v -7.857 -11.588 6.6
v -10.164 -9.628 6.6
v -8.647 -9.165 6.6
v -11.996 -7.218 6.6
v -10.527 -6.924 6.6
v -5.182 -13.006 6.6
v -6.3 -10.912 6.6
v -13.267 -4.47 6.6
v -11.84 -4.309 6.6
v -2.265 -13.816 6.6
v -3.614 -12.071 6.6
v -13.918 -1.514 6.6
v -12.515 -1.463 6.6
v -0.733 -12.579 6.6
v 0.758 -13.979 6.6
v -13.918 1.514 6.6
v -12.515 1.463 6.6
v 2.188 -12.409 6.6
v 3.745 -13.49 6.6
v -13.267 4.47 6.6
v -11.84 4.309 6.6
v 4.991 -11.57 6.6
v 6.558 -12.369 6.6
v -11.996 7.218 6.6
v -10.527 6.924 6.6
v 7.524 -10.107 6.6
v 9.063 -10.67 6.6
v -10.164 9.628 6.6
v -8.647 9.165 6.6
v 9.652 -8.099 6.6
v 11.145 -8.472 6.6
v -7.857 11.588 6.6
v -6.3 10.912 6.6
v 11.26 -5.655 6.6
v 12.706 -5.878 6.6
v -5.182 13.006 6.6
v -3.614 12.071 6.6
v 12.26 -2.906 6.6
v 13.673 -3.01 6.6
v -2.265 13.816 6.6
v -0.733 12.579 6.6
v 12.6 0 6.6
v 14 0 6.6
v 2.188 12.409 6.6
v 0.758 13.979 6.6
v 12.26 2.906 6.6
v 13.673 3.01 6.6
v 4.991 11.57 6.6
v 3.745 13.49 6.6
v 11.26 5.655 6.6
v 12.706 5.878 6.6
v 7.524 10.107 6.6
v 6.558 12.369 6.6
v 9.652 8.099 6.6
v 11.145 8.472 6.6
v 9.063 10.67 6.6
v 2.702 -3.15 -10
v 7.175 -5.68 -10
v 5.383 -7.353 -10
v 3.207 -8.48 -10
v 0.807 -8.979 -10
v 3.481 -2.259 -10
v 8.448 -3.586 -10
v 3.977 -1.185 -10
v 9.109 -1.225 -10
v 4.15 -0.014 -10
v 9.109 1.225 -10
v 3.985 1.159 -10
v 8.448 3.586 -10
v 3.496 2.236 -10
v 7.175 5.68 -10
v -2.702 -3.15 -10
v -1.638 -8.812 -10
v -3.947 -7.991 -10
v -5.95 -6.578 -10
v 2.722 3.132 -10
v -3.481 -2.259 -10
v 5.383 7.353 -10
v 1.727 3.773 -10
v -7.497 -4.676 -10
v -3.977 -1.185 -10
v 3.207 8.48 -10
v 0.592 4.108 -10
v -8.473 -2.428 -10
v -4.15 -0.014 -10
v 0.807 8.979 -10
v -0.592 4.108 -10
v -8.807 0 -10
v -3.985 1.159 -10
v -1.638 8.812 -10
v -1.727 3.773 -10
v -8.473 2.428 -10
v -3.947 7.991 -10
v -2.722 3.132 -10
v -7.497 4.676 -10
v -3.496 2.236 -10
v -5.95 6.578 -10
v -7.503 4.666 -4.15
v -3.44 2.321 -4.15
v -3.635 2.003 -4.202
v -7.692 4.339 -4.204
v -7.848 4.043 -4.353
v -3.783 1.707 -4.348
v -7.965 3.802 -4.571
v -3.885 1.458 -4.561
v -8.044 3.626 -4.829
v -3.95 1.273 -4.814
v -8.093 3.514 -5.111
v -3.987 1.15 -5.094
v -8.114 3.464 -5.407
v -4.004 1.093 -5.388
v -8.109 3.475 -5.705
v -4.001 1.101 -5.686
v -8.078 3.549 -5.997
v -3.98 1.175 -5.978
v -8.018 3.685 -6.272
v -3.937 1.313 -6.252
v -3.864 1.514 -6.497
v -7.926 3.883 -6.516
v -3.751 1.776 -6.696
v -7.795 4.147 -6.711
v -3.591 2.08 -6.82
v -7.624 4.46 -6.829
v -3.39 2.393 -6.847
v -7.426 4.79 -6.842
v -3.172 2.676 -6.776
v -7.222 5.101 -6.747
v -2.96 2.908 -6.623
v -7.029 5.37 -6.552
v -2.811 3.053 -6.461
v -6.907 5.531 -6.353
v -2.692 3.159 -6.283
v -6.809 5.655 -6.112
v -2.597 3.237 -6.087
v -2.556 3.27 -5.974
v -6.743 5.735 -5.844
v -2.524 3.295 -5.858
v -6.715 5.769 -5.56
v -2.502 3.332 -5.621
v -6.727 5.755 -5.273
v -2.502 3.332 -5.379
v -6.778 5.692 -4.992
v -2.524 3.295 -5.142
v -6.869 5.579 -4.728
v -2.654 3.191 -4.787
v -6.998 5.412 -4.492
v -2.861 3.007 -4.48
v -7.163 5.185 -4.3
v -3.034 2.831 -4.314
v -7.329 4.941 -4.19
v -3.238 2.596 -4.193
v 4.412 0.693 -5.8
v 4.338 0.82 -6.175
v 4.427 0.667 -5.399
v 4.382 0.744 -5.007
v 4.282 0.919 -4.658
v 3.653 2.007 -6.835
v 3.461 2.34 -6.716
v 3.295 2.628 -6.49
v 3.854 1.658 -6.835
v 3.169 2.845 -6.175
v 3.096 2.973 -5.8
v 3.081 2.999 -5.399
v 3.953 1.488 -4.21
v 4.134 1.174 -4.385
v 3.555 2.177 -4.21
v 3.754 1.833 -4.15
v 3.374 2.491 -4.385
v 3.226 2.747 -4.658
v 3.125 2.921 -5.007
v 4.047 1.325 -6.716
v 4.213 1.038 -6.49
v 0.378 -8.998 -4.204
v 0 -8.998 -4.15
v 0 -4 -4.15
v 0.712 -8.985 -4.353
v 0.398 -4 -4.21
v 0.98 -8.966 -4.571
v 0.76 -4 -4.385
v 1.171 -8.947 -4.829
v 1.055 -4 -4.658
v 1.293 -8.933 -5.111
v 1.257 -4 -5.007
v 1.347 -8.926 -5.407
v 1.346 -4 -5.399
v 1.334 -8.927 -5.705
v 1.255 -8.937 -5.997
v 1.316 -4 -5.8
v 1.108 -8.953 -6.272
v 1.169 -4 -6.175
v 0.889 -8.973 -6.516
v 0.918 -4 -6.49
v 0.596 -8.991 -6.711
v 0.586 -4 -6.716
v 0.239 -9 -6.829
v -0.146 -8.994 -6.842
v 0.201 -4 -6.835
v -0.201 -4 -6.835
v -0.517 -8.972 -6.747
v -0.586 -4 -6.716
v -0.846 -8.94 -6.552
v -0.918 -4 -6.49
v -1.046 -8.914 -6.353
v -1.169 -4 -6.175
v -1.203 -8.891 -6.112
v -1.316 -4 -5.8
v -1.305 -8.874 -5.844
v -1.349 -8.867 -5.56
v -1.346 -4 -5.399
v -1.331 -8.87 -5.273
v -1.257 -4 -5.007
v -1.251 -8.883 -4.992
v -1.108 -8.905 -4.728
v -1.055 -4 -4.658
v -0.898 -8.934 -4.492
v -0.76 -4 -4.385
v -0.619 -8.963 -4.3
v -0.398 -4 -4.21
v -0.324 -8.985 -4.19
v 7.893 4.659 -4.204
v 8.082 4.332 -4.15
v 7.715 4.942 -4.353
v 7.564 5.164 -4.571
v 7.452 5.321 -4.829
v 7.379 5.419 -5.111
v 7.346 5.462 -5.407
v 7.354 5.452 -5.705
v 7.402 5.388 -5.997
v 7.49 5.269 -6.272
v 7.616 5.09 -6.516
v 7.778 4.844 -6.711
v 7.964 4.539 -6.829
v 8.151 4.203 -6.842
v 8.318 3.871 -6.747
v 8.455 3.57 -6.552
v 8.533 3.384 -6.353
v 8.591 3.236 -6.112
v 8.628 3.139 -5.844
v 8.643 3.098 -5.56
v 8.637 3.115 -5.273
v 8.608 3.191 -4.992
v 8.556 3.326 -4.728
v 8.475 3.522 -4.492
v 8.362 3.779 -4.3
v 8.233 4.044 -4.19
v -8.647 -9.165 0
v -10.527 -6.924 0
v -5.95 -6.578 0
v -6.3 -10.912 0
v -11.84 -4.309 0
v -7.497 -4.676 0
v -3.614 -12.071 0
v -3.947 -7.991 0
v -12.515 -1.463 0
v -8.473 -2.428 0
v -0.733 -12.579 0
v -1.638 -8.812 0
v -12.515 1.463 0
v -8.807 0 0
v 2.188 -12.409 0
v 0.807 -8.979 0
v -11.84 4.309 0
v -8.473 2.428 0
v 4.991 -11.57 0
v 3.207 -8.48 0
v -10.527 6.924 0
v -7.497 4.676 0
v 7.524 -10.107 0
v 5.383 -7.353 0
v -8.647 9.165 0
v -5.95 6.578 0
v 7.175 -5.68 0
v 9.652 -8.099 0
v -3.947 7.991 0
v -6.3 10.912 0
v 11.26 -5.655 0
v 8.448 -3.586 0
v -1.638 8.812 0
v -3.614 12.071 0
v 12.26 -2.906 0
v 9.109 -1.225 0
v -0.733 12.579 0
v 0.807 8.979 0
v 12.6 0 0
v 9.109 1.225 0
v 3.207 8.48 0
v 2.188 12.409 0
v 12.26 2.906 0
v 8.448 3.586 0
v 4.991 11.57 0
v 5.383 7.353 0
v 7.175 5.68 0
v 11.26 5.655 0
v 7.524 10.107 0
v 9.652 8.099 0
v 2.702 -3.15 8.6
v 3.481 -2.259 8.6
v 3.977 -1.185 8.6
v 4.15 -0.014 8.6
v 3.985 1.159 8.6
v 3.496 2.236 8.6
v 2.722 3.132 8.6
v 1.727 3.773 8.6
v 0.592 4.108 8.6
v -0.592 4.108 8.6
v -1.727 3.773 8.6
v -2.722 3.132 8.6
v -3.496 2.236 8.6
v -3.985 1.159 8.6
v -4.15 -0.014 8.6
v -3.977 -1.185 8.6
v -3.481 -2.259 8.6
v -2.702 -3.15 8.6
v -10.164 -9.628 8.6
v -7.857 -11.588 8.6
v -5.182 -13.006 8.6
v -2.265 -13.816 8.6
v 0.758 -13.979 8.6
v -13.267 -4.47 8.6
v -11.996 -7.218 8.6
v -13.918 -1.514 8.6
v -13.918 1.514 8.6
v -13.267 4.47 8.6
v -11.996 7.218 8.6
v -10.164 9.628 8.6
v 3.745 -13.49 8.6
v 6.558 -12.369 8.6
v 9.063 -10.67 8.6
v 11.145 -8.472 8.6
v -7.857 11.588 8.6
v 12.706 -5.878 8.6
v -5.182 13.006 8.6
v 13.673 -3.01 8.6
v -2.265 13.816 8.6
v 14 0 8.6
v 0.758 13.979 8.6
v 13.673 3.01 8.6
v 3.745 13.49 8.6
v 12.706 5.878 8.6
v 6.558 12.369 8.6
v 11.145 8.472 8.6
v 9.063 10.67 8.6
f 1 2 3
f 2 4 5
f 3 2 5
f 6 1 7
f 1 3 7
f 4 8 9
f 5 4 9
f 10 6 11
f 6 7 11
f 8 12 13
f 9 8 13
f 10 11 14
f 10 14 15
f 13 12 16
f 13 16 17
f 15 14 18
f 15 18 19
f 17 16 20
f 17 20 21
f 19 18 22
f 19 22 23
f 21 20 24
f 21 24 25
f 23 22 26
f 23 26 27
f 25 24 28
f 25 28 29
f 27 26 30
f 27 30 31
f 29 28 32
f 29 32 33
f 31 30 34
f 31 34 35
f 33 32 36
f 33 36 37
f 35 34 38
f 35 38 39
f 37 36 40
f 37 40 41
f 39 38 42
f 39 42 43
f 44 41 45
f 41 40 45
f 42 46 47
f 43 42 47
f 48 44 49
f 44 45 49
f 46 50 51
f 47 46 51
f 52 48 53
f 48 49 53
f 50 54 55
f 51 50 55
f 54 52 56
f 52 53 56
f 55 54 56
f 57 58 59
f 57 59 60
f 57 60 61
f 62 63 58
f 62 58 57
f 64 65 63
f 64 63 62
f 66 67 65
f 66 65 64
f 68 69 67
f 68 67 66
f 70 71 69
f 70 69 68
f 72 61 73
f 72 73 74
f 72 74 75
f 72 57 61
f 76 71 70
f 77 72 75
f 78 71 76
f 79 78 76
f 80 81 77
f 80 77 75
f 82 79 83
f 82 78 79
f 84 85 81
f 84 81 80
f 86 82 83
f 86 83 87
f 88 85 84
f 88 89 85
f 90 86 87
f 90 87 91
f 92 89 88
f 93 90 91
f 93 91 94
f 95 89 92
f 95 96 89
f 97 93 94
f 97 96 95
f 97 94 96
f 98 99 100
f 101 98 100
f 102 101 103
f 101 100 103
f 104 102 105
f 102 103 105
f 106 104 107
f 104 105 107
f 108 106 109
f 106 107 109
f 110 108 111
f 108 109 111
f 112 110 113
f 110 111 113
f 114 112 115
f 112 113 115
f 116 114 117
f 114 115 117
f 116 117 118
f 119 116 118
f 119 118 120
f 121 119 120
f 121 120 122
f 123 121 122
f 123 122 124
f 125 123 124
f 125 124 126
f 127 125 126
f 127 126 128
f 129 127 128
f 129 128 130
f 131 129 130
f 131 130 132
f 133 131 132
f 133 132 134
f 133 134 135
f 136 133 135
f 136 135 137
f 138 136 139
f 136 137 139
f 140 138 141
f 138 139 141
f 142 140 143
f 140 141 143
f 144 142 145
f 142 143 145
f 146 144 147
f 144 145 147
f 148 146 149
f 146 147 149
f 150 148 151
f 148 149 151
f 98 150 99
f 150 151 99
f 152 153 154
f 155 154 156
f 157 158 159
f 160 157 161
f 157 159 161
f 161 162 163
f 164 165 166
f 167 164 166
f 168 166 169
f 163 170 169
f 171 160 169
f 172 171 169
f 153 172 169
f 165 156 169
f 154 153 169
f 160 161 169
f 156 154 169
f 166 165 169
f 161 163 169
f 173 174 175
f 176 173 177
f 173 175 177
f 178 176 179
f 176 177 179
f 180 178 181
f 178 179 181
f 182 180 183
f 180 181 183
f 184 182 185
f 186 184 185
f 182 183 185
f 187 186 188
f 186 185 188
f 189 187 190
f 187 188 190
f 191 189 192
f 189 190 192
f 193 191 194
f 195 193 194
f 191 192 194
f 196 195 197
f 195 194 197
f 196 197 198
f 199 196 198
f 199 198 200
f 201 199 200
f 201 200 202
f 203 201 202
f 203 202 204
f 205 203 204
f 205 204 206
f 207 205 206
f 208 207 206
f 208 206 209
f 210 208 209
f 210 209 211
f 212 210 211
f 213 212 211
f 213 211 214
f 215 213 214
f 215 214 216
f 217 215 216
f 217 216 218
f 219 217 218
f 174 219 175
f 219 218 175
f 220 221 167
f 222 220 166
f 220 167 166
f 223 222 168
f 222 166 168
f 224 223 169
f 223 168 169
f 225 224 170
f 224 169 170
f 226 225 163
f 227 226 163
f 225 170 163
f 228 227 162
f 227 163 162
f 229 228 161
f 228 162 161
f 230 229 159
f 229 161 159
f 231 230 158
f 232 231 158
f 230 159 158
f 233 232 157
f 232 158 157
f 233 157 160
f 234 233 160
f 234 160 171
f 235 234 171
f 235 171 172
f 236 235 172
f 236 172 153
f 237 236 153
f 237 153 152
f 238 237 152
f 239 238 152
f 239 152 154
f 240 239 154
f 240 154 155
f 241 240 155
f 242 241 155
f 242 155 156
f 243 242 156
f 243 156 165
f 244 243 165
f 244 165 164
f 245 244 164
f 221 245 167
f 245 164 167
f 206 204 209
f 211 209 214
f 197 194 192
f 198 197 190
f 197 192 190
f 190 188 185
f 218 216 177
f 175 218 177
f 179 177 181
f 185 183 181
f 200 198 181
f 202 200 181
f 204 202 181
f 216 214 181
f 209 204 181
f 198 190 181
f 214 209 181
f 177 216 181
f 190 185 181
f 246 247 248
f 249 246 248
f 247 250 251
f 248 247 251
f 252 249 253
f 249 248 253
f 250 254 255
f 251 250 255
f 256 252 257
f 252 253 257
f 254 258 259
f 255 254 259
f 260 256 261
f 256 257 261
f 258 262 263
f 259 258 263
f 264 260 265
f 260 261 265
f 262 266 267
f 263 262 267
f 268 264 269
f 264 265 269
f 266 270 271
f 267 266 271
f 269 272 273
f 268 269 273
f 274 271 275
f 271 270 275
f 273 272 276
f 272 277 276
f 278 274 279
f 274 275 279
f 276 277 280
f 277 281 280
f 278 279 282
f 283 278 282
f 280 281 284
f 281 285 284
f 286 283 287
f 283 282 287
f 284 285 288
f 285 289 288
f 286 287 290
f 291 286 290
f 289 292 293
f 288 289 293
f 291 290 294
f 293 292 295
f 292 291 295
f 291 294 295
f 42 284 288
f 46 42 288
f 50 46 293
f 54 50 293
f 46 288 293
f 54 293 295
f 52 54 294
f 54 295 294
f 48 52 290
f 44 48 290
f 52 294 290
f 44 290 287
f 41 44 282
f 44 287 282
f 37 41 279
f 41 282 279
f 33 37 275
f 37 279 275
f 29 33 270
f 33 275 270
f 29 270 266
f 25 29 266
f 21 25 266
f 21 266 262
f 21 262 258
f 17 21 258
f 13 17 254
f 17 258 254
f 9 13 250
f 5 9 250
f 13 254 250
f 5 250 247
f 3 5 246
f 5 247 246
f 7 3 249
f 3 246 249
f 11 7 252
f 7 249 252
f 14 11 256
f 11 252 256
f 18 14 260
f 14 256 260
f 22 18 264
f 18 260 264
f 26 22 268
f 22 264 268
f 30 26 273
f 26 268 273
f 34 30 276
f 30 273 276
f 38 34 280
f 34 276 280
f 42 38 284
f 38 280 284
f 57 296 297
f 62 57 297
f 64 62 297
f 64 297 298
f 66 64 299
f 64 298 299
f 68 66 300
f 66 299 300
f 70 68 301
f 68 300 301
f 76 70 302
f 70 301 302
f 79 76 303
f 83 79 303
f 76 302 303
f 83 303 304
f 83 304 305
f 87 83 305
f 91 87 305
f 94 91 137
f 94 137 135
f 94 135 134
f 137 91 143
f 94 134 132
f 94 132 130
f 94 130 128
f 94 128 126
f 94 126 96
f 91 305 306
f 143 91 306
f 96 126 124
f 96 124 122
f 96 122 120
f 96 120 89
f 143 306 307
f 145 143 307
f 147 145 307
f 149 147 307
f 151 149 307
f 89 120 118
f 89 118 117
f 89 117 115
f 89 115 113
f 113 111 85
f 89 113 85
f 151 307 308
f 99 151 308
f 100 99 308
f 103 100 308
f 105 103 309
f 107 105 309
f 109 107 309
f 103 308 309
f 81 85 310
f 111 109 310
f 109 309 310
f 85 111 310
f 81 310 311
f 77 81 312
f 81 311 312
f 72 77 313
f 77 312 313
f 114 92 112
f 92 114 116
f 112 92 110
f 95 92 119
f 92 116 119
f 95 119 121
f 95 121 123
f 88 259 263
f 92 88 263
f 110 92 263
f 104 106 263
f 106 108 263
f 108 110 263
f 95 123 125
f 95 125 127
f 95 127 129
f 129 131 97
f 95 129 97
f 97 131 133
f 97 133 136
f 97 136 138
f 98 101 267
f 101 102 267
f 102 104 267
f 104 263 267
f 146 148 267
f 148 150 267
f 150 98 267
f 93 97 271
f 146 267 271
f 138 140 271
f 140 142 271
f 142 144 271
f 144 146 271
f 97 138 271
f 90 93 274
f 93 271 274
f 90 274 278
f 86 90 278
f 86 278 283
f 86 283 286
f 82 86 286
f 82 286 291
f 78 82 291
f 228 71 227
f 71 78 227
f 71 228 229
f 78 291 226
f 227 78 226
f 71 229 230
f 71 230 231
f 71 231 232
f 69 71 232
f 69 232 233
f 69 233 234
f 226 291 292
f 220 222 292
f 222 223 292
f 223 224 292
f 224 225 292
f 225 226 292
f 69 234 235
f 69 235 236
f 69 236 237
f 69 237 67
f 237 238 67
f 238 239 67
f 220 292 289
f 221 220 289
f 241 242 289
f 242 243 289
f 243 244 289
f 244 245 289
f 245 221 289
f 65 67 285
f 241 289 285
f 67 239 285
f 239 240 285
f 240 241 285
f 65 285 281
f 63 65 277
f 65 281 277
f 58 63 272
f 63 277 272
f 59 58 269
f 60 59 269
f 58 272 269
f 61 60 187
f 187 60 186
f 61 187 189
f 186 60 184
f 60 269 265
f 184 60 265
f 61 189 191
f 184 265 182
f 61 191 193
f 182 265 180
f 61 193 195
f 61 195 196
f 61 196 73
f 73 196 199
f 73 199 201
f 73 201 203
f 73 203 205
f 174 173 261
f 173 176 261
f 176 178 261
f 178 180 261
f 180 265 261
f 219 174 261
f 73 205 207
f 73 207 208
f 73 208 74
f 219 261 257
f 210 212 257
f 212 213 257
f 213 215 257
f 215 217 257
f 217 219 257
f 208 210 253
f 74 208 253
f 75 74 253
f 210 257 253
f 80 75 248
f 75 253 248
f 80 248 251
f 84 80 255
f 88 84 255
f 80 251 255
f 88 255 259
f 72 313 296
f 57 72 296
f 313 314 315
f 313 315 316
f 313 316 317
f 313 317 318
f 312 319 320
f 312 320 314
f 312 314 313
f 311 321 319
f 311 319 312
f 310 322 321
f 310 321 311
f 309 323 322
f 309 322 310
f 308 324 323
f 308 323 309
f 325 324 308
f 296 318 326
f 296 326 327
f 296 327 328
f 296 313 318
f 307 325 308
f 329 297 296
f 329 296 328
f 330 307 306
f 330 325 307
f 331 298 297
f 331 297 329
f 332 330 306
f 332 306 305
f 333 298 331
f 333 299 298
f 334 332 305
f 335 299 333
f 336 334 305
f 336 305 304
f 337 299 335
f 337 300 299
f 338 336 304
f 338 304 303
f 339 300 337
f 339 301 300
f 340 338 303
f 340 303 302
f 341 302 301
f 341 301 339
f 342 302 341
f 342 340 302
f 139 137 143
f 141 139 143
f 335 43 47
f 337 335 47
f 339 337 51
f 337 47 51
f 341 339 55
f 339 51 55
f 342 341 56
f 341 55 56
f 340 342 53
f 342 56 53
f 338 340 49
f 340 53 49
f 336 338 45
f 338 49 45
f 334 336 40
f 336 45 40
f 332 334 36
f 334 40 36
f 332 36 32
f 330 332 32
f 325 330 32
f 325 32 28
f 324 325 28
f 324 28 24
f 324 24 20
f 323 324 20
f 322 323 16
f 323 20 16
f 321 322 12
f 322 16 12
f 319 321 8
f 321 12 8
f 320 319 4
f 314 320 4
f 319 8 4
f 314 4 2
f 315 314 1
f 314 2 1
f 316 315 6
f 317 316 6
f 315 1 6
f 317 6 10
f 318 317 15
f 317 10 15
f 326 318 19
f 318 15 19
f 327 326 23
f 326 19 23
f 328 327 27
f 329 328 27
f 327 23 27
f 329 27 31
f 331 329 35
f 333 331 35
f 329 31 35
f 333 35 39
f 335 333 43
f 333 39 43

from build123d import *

# Parameters (mm, degrees)
SKETCH_1_R               = 12.6
EXTRUDE_1_DEPTH          = 6.6
SKETCH_2_R               = 14
EXTRUDE_2_DEPTH          = 2
SKETCH_4_R               = 9
EXTRUDE_3_DEPTH          = 10
CUT_EXTRUDE_START        = -4
SKETCH_5_R               = 1.35
CUT_EXTRUDE_2_DEPTH      = 8
CUT_EXTRUDE_1_DEPTH      = 28.165419263
PATTERN_CIRCULAR_1_COUNT = 3


with BuildPart() as part:
    # 草图1 → 凸台-拉伸1 (new body)
    with BuildSketch(Plane.XY):
        Circle(SKETCH_1_R)
    extrude(amount=EXTRUDE_1_DEPTH)

    # 草图2 → 凸台-拉伸2 (add)
    with BuildSketch(Plane.XY.offset(6.6)):
        Circle(SKETCH_2_R)
    extrude(amount=EXTRUDE_2_DEPTH)

    # 草图4 → 凸台-拉伸3 (add)
    with BuildSketch(Plane(origin=(0, 0, 0), x_dir=(-1, 0, 0), z_dir=(0, 0, -1))):
        with Locations((-0.193153064, 0)):
            Circle(SKETCH_4_R)
    extrude(amount=EXTRUDE_3_DEPTH)

    # 草图5 → 切除-拉伸2 (cut)
    with BuildSketch(Plane(origin=(0, 0, 0), x_dir=(1, 0, 0), z_dir=(0, 1, 0)).offset(CUT_EXTRUDE_START)):
        with Locations(Location((0, 5.5, 0), (0, 0, 270))):
            Circle(SKETCH_5_R)
    cut_extrude_2 = extrude(amount=-CUT_EXTRUDE_2_DEPTH, mode=Mode.SUBTRACT)

    # 草图3 → 切除-拉伸1 (cut, through all)
    with BuildSketch(Plane.XY.offset(8.6)):
        with BuildLine():
            Line((-2.701851217, -3.15), (2.701851217, -3.15))
            ThreePointArc((2.701851217, -3.15), (0, 4.15), (-2.701851217, -3.15))
        make_face()
    extrude(amount=-CUT_EXTRUDE_1_DEPTH, mode=Mode.SUBTRACT)

    # 阵列(圆周)1: 切除-拉伸2 ×3 about axis
    pattern_circular_1_axis = Axis((0.193153064, 0, 0), (0, 0, 1))
    for i in range(1, PATTERN_CIRCULAR_1_COUNT):
        add(cut_extrude_2.rotate(pattern_circular_1_axis, i * 360 / PATTERN_CIRCULAR_1_COUNT), mode=Mode.SUBTRACT)


solid = part.part
